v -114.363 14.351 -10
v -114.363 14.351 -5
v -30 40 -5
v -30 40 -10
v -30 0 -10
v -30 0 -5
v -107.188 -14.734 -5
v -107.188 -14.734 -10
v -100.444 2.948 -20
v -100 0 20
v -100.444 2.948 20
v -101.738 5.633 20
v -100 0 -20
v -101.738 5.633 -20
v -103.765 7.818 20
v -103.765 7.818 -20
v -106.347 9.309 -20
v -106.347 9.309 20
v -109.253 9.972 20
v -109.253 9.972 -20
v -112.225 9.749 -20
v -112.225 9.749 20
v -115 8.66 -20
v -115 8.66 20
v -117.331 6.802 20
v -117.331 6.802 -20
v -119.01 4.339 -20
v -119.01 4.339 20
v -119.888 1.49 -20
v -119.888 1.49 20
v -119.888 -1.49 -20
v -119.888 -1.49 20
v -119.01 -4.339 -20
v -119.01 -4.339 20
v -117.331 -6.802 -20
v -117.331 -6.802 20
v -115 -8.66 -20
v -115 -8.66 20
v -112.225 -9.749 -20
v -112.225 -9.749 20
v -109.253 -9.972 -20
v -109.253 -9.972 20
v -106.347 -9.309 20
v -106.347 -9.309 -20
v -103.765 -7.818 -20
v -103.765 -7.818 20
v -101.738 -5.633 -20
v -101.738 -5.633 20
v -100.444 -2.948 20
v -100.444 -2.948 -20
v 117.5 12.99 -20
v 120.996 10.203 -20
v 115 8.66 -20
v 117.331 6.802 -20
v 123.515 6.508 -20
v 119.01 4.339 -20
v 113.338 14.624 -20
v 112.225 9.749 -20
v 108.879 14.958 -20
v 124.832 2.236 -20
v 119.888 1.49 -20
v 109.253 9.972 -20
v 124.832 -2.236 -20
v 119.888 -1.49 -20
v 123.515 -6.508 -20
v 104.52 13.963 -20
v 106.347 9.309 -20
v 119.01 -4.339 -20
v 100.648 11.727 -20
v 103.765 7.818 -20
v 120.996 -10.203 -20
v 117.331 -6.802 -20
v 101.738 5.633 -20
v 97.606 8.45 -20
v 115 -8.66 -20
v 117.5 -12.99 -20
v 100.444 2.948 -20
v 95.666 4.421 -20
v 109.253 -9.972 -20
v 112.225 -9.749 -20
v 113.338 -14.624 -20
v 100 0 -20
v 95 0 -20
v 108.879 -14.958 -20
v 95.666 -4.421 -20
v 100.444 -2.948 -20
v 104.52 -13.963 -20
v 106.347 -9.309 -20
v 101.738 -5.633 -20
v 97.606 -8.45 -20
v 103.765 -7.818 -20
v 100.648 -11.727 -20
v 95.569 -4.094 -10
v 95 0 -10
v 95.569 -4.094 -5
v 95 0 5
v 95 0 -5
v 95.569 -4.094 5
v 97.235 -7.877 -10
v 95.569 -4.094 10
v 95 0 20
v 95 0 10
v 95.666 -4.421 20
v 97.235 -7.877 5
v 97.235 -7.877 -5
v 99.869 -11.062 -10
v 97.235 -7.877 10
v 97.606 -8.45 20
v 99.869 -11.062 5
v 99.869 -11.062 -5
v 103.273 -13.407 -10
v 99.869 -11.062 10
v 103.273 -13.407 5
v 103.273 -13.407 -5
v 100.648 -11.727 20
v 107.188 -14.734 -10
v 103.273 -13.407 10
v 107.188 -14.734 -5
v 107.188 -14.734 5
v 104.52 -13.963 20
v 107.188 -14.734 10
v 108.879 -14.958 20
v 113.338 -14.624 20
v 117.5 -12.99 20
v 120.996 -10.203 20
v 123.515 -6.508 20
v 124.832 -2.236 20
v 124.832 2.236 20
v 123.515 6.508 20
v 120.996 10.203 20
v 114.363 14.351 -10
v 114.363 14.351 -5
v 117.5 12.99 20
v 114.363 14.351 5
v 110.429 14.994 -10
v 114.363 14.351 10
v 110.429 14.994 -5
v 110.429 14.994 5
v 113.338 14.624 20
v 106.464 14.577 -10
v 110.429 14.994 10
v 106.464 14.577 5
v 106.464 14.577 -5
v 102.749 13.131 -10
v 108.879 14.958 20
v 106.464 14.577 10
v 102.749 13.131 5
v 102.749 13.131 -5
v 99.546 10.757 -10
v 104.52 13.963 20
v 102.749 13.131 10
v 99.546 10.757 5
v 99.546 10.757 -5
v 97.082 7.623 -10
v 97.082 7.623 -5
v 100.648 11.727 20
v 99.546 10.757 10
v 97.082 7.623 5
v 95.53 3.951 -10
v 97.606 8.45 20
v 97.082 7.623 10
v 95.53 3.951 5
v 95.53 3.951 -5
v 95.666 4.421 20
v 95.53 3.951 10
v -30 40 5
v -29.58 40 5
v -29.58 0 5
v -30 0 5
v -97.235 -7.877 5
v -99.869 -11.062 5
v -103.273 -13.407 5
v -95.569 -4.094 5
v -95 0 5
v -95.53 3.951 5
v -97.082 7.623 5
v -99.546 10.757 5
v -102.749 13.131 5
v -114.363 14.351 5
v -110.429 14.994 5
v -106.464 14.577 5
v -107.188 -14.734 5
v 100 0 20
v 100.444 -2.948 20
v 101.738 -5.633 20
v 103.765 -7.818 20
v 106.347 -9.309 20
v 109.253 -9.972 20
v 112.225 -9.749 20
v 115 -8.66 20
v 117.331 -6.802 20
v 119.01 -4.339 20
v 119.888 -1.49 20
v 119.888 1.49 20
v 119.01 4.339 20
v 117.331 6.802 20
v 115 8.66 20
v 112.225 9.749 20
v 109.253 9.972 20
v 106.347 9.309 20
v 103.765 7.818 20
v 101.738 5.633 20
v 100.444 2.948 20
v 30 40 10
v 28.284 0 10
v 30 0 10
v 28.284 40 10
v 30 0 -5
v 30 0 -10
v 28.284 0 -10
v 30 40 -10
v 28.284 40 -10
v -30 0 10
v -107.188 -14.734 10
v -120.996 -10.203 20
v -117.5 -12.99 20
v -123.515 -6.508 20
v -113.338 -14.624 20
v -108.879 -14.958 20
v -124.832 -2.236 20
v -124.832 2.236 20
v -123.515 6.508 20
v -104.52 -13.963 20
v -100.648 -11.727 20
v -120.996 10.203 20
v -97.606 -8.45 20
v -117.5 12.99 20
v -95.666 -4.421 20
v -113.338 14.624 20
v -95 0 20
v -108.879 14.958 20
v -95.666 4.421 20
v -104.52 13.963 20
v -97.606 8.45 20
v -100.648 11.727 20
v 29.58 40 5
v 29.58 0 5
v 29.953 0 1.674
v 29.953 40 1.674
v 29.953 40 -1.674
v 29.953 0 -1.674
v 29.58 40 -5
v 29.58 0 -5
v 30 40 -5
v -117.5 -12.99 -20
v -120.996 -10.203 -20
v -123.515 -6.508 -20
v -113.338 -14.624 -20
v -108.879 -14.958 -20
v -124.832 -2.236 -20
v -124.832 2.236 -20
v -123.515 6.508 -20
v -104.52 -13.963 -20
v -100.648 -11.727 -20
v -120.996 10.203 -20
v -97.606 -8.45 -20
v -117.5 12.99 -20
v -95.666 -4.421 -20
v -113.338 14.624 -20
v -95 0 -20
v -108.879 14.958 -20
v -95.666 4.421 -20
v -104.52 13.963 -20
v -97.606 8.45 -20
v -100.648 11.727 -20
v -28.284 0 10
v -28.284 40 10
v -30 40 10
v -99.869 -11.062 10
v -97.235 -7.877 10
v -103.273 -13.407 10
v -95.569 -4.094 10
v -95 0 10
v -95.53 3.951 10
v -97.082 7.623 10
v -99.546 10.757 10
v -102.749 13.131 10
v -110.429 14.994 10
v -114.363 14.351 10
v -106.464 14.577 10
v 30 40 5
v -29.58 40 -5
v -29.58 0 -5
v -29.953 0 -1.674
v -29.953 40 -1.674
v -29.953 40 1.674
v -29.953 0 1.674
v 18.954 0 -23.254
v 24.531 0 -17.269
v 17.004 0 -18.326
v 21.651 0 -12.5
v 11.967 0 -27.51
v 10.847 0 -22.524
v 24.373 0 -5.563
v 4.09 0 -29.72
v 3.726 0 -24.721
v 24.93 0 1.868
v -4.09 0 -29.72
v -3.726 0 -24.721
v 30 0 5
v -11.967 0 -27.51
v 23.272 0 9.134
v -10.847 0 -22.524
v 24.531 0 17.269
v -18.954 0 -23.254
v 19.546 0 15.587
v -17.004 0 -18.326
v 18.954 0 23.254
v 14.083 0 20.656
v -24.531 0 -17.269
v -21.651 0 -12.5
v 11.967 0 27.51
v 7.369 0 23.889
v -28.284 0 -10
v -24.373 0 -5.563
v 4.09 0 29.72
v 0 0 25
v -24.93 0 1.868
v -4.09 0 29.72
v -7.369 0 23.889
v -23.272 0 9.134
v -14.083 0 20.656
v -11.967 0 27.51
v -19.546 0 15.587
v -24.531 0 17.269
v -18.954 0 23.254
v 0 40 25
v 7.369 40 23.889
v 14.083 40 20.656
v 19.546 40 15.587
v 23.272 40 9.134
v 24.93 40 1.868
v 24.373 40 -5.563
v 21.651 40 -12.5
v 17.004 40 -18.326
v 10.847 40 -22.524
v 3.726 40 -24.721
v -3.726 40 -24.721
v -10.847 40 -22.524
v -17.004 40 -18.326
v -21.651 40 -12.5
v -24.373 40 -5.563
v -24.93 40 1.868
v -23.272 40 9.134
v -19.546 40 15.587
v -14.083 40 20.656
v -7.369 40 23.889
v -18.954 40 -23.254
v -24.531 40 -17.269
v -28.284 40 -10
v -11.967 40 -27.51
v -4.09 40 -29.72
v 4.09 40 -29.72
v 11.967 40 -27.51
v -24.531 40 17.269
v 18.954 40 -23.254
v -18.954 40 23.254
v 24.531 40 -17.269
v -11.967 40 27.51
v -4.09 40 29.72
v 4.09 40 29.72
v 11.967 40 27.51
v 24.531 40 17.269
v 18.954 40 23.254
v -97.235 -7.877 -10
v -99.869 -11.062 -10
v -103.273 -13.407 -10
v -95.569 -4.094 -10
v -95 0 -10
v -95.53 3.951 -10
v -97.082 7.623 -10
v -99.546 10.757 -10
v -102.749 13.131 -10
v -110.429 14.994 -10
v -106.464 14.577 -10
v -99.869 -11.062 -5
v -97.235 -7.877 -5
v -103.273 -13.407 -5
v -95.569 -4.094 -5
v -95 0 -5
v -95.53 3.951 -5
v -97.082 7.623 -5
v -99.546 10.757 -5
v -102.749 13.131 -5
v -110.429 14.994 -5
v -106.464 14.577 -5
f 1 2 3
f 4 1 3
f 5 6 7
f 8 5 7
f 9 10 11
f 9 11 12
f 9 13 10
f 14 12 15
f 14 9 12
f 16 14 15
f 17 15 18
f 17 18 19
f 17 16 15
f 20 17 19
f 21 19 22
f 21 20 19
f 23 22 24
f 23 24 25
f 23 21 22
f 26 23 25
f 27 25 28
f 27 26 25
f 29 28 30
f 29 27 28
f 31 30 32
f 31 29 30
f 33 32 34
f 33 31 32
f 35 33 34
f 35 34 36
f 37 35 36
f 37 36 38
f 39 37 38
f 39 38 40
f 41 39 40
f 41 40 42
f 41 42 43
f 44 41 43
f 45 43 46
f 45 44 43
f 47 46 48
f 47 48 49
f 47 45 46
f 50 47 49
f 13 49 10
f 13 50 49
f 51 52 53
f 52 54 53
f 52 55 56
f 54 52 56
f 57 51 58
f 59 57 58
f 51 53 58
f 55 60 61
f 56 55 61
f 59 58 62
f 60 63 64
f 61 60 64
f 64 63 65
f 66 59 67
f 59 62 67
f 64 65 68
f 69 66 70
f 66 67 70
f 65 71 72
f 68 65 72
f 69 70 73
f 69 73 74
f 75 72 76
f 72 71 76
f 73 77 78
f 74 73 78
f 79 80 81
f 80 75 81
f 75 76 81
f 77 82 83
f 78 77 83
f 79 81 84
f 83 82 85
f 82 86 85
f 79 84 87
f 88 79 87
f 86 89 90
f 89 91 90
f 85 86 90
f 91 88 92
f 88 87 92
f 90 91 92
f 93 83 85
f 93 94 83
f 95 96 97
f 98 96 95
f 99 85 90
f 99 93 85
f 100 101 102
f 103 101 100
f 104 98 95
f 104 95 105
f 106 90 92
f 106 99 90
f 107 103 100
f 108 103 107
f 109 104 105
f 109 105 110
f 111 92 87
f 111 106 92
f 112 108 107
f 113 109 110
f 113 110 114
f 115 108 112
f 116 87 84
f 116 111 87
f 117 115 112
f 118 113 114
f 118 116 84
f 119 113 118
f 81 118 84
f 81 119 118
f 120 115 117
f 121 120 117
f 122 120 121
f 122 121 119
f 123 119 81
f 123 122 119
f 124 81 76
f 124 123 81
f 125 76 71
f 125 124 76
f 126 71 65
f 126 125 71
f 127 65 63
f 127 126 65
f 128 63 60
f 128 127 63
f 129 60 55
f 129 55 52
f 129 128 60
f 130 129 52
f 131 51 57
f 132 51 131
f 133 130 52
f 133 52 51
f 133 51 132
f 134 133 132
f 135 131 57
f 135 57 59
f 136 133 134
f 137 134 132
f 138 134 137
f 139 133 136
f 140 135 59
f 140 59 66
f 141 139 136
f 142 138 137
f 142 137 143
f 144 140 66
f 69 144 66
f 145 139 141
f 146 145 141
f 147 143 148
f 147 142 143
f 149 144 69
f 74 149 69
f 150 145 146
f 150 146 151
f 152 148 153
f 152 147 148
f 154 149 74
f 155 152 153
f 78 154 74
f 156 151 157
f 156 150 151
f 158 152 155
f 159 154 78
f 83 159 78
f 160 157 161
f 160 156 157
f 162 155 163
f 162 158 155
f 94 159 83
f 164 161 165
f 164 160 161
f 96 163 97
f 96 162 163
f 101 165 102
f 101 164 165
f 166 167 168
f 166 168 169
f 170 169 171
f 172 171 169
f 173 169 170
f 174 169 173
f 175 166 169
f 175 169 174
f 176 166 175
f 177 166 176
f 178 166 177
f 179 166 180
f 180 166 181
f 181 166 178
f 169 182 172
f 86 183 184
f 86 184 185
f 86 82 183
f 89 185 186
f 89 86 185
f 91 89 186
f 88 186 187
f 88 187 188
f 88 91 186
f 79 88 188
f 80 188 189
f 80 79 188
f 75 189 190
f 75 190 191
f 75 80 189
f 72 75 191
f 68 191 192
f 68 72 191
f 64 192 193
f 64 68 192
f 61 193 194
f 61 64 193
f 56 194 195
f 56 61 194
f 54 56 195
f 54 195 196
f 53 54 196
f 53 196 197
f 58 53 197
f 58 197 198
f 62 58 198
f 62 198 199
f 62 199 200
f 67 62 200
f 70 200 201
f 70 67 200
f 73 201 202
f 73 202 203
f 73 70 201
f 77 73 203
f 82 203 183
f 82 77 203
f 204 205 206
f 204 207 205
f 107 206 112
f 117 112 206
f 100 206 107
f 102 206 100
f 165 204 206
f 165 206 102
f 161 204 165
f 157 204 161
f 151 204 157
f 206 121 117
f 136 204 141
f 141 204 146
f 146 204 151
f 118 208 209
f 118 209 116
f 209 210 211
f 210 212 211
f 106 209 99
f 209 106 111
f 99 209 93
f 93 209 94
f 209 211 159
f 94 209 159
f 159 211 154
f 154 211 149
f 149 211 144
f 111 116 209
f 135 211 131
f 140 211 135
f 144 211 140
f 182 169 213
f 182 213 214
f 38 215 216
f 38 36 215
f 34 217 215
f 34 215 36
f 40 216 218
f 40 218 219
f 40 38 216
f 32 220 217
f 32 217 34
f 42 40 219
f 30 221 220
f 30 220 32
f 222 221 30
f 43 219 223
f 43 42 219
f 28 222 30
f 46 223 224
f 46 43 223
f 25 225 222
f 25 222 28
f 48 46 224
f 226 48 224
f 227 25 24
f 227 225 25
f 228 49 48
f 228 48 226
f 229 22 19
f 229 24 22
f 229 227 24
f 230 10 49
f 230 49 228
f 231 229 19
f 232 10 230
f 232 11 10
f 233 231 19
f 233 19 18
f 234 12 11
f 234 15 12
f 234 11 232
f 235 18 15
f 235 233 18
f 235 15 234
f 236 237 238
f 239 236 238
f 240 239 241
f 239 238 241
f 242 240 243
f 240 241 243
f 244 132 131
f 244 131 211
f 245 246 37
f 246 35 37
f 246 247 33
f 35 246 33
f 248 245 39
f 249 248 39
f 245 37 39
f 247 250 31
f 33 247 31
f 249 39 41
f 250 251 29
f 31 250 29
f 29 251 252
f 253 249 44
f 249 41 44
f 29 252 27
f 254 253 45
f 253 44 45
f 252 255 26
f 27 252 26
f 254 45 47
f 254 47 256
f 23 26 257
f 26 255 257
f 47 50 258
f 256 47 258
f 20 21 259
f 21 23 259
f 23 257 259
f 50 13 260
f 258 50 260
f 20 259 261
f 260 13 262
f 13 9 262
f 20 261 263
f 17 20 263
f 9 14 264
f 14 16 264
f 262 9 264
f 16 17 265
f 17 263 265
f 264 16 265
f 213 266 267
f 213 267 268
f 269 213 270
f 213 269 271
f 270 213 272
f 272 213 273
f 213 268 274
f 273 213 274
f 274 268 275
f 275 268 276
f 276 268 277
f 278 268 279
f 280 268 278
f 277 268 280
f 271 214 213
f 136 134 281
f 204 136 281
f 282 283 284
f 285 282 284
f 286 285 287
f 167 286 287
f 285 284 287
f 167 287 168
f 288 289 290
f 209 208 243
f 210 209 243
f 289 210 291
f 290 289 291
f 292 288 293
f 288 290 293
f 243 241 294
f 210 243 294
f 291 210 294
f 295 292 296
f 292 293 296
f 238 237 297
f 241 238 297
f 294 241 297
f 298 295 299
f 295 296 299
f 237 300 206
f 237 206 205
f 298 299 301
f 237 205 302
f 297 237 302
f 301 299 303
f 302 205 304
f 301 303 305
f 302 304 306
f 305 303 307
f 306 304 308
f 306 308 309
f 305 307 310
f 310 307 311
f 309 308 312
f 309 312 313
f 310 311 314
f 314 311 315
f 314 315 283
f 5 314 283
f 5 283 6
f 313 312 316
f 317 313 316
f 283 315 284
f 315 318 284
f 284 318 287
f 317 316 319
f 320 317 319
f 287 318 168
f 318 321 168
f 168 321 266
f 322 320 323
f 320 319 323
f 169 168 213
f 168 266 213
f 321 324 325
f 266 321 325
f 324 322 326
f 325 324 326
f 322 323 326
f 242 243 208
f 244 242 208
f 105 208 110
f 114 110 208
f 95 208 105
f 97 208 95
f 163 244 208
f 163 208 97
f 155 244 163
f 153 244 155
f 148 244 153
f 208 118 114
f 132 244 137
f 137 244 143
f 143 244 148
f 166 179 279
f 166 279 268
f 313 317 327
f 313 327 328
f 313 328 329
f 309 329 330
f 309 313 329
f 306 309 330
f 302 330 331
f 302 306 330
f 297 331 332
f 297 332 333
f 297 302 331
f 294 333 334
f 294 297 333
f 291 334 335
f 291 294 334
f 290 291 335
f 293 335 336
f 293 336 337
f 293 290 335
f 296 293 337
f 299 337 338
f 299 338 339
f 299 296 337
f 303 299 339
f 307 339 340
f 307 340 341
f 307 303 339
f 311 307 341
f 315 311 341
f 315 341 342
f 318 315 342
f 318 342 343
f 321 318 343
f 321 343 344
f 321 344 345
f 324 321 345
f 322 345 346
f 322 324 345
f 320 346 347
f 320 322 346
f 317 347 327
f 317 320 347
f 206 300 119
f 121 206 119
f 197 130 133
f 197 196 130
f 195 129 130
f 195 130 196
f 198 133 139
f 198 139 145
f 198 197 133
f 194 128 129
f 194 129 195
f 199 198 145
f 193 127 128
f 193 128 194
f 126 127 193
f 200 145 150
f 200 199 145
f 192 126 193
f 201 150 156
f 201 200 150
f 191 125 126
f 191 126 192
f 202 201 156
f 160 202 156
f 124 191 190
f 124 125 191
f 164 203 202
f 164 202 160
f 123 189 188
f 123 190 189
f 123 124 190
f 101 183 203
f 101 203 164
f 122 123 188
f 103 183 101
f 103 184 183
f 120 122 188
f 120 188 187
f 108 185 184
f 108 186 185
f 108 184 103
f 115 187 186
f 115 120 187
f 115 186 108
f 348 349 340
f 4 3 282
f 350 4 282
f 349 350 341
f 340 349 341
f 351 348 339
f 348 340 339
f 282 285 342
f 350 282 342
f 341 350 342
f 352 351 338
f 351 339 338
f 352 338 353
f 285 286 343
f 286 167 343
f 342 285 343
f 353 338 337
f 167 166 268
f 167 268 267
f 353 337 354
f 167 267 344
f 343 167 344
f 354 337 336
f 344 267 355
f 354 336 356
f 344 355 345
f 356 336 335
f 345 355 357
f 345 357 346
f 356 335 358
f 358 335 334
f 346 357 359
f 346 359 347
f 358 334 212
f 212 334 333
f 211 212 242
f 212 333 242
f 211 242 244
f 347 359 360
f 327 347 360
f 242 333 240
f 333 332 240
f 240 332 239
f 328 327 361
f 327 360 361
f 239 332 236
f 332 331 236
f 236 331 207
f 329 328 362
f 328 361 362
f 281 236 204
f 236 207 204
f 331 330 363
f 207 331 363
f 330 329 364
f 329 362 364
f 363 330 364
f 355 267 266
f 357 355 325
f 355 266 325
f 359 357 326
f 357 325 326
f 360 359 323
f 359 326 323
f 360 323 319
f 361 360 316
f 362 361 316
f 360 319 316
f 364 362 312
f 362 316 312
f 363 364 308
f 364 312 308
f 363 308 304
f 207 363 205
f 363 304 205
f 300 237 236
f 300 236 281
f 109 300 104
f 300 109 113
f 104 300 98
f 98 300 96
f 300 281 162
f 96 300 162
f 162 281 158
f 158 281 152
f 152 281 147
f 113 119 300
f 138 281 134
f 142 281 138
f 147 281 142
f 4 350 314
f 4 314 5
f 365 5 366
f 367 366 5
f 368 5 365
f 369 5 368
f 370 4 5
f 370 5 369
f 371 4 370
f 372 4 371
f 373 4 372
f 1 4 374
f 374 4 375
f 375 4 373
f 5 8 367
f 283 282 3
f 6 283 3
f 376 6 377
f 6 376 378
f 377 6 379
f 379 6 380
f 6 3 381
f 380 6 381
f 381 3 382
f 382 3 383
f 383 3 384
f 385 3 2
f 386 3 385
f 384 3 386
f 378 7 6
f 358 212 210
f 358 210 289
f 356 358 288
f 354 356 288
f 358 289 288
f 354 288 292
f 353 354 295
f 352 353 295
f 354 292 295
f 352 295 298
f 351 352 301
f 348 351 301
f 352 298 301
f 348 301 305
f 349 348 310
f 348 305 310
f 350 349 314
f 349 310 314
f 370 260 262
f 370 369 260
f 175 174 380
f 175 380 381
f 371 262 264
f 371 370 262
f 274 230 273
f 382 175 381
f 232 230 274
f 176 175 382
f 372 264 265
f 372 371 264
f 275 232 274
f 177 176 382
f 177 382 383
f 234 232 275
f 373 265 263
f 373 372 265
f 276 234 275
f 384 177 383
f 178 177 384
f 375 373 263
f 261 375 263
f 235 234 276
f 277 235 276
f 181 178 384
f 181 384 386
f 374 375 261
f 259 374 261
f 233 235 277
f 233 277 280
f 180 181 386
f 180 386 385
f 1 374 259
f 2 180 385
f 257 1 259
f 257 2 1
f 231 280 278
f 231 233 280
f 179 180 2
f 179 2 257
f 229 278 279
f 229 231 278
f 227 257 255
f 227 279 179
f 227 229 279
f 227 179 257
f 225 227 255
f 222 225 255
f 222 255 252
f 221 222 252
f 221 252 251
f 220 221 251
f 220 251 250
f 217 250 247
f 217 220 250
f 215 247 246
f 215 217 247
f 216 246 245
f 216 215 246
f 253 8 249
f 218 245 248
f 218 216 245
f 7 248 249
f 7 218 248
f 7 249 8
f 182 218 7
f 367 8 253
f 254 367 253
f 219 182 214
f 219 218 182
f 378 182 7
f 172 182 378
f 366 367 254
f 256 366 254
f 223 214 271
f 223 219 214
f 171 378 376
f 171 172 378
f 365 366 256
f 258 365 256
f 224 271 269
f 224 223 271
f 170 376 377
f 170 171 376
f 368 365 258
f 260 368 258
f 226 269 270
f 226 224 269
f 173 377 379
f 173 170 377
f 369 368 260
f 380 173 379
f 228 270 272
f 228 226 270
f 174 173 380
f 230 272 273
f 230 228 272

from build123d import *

# Parameters (mm, degrees)
SKETCH1_R             = 30
SKETCH1_R_2           = 25
BOSS_EXTRUDE1_DEPTH   = 40
SKETCH4_R             = 15
SKETCH4_R_2           = 10
BOSS_EXTRUDE2_DEPTH   = 20
BOSS_EXTRUDE2_2_DEPTH = 20
BOSS_EXTRUDE3_START   = 5
BOSS_EXTRUDE3_DEPTH   = 5


with BuildPart() as part:
    # Sketch1 → Boss-Extrude1 (new body)
    with BuildSketch(Plane(origin=(0, 0, 0), x_dir=(1, 0, 0), z_dir=(0, 1, 0))):
        with Locations(Location((0, 0, 0), (0, 0, 270))):
            Circle(SKETCH1_R)
        with Locations(Location((0, 0, 0), (0, 0, 270))):
            Circle(SKETCH1_R_2, mode=Mode.SUBTRACT)
    extrude(amount=BOSS_EXTRUDE1_DEPTH)


with BuildPart() as body_2:
    # Sketch4 → Boss-Extrude2 (new, symmetric)
    with BuildSketch(Plane.XY):
        with Locations((-110, 0)):
            Circle(SKETCH4_R)
        with Locations((-110, 0)):
            Circle(SKETCH4_R_2, mode=Mode.SUBTRACT)
    extrude(amount=BOSS_EXTRUDE2_DEPTH, both=True)



with BuildPart() as body_3:
    # Sketch4 → Boss-Extrude2 2 (new, symmetric)
    with BuildSketch(Plane.XY):
        with Locations(Location((110, 0, 0), (0, 0, 180))):
            Circle(SKETCH4_R)
        with Locations(Location((110, 0, 0), (0, 0, 180))):
            Circle(SKETCH4_R_2, mode=Mode.SUBTRACT)
    extrude(amount=BOSS_EXTRUDE2_2_DEPTH, both=True)


with BuildPart() as body_2_1:
    add(body_2.part)

    add(body_3.part)  # Boss-Extrude3 merges body 3
    # Sketch5 → Boss-Extrude3 (add)
    with BuildSketch(Plane.XY.offset(BOSS_EXTRUDE3_START)):
        with BuildLine():
            Line((-114.363197033, 14.351394066), (-30, 40))
            Line((-30, 40), (-25, 40))
            Line((-25, 40), (-25, 0))
            Line((-25, 0), (-30, 0))
            Line((-30, 0), (-107.1875, -14.733969043))
            ThreePointArc((-107.1875, -14.733969043), (-95.436664114, 3.59294418), (-114.363197033, 14.351394066))
        make_face()
        with BuildLine():
            Line((30, 0), (107.1875, -14.733969043))
            ThreePointArc((107.1875, -14.733969043), (95.436664114, 3.59294418), (114.363197033, 14.351394066))
            Line((114.363197033, 14.351394066), (30, 40))
            Line((30, 40), (25, 40))
            Line((25, 40), (25, 0))
            Line((25, 0), (30, 0))
        make_face()
    boss_extrude3 = extrude(amount=BOSS_EXTRUDE3_DEPTH)


with BuildPart() as part_1:
    add(part.part)

    add(body_2_1.part)  # Mirror2 merges body 2
    # Mirror2: Boss-Extrude3 across plane
    add(boss_extrude3.mirror(Plane.XY))


solid = part_1.part
